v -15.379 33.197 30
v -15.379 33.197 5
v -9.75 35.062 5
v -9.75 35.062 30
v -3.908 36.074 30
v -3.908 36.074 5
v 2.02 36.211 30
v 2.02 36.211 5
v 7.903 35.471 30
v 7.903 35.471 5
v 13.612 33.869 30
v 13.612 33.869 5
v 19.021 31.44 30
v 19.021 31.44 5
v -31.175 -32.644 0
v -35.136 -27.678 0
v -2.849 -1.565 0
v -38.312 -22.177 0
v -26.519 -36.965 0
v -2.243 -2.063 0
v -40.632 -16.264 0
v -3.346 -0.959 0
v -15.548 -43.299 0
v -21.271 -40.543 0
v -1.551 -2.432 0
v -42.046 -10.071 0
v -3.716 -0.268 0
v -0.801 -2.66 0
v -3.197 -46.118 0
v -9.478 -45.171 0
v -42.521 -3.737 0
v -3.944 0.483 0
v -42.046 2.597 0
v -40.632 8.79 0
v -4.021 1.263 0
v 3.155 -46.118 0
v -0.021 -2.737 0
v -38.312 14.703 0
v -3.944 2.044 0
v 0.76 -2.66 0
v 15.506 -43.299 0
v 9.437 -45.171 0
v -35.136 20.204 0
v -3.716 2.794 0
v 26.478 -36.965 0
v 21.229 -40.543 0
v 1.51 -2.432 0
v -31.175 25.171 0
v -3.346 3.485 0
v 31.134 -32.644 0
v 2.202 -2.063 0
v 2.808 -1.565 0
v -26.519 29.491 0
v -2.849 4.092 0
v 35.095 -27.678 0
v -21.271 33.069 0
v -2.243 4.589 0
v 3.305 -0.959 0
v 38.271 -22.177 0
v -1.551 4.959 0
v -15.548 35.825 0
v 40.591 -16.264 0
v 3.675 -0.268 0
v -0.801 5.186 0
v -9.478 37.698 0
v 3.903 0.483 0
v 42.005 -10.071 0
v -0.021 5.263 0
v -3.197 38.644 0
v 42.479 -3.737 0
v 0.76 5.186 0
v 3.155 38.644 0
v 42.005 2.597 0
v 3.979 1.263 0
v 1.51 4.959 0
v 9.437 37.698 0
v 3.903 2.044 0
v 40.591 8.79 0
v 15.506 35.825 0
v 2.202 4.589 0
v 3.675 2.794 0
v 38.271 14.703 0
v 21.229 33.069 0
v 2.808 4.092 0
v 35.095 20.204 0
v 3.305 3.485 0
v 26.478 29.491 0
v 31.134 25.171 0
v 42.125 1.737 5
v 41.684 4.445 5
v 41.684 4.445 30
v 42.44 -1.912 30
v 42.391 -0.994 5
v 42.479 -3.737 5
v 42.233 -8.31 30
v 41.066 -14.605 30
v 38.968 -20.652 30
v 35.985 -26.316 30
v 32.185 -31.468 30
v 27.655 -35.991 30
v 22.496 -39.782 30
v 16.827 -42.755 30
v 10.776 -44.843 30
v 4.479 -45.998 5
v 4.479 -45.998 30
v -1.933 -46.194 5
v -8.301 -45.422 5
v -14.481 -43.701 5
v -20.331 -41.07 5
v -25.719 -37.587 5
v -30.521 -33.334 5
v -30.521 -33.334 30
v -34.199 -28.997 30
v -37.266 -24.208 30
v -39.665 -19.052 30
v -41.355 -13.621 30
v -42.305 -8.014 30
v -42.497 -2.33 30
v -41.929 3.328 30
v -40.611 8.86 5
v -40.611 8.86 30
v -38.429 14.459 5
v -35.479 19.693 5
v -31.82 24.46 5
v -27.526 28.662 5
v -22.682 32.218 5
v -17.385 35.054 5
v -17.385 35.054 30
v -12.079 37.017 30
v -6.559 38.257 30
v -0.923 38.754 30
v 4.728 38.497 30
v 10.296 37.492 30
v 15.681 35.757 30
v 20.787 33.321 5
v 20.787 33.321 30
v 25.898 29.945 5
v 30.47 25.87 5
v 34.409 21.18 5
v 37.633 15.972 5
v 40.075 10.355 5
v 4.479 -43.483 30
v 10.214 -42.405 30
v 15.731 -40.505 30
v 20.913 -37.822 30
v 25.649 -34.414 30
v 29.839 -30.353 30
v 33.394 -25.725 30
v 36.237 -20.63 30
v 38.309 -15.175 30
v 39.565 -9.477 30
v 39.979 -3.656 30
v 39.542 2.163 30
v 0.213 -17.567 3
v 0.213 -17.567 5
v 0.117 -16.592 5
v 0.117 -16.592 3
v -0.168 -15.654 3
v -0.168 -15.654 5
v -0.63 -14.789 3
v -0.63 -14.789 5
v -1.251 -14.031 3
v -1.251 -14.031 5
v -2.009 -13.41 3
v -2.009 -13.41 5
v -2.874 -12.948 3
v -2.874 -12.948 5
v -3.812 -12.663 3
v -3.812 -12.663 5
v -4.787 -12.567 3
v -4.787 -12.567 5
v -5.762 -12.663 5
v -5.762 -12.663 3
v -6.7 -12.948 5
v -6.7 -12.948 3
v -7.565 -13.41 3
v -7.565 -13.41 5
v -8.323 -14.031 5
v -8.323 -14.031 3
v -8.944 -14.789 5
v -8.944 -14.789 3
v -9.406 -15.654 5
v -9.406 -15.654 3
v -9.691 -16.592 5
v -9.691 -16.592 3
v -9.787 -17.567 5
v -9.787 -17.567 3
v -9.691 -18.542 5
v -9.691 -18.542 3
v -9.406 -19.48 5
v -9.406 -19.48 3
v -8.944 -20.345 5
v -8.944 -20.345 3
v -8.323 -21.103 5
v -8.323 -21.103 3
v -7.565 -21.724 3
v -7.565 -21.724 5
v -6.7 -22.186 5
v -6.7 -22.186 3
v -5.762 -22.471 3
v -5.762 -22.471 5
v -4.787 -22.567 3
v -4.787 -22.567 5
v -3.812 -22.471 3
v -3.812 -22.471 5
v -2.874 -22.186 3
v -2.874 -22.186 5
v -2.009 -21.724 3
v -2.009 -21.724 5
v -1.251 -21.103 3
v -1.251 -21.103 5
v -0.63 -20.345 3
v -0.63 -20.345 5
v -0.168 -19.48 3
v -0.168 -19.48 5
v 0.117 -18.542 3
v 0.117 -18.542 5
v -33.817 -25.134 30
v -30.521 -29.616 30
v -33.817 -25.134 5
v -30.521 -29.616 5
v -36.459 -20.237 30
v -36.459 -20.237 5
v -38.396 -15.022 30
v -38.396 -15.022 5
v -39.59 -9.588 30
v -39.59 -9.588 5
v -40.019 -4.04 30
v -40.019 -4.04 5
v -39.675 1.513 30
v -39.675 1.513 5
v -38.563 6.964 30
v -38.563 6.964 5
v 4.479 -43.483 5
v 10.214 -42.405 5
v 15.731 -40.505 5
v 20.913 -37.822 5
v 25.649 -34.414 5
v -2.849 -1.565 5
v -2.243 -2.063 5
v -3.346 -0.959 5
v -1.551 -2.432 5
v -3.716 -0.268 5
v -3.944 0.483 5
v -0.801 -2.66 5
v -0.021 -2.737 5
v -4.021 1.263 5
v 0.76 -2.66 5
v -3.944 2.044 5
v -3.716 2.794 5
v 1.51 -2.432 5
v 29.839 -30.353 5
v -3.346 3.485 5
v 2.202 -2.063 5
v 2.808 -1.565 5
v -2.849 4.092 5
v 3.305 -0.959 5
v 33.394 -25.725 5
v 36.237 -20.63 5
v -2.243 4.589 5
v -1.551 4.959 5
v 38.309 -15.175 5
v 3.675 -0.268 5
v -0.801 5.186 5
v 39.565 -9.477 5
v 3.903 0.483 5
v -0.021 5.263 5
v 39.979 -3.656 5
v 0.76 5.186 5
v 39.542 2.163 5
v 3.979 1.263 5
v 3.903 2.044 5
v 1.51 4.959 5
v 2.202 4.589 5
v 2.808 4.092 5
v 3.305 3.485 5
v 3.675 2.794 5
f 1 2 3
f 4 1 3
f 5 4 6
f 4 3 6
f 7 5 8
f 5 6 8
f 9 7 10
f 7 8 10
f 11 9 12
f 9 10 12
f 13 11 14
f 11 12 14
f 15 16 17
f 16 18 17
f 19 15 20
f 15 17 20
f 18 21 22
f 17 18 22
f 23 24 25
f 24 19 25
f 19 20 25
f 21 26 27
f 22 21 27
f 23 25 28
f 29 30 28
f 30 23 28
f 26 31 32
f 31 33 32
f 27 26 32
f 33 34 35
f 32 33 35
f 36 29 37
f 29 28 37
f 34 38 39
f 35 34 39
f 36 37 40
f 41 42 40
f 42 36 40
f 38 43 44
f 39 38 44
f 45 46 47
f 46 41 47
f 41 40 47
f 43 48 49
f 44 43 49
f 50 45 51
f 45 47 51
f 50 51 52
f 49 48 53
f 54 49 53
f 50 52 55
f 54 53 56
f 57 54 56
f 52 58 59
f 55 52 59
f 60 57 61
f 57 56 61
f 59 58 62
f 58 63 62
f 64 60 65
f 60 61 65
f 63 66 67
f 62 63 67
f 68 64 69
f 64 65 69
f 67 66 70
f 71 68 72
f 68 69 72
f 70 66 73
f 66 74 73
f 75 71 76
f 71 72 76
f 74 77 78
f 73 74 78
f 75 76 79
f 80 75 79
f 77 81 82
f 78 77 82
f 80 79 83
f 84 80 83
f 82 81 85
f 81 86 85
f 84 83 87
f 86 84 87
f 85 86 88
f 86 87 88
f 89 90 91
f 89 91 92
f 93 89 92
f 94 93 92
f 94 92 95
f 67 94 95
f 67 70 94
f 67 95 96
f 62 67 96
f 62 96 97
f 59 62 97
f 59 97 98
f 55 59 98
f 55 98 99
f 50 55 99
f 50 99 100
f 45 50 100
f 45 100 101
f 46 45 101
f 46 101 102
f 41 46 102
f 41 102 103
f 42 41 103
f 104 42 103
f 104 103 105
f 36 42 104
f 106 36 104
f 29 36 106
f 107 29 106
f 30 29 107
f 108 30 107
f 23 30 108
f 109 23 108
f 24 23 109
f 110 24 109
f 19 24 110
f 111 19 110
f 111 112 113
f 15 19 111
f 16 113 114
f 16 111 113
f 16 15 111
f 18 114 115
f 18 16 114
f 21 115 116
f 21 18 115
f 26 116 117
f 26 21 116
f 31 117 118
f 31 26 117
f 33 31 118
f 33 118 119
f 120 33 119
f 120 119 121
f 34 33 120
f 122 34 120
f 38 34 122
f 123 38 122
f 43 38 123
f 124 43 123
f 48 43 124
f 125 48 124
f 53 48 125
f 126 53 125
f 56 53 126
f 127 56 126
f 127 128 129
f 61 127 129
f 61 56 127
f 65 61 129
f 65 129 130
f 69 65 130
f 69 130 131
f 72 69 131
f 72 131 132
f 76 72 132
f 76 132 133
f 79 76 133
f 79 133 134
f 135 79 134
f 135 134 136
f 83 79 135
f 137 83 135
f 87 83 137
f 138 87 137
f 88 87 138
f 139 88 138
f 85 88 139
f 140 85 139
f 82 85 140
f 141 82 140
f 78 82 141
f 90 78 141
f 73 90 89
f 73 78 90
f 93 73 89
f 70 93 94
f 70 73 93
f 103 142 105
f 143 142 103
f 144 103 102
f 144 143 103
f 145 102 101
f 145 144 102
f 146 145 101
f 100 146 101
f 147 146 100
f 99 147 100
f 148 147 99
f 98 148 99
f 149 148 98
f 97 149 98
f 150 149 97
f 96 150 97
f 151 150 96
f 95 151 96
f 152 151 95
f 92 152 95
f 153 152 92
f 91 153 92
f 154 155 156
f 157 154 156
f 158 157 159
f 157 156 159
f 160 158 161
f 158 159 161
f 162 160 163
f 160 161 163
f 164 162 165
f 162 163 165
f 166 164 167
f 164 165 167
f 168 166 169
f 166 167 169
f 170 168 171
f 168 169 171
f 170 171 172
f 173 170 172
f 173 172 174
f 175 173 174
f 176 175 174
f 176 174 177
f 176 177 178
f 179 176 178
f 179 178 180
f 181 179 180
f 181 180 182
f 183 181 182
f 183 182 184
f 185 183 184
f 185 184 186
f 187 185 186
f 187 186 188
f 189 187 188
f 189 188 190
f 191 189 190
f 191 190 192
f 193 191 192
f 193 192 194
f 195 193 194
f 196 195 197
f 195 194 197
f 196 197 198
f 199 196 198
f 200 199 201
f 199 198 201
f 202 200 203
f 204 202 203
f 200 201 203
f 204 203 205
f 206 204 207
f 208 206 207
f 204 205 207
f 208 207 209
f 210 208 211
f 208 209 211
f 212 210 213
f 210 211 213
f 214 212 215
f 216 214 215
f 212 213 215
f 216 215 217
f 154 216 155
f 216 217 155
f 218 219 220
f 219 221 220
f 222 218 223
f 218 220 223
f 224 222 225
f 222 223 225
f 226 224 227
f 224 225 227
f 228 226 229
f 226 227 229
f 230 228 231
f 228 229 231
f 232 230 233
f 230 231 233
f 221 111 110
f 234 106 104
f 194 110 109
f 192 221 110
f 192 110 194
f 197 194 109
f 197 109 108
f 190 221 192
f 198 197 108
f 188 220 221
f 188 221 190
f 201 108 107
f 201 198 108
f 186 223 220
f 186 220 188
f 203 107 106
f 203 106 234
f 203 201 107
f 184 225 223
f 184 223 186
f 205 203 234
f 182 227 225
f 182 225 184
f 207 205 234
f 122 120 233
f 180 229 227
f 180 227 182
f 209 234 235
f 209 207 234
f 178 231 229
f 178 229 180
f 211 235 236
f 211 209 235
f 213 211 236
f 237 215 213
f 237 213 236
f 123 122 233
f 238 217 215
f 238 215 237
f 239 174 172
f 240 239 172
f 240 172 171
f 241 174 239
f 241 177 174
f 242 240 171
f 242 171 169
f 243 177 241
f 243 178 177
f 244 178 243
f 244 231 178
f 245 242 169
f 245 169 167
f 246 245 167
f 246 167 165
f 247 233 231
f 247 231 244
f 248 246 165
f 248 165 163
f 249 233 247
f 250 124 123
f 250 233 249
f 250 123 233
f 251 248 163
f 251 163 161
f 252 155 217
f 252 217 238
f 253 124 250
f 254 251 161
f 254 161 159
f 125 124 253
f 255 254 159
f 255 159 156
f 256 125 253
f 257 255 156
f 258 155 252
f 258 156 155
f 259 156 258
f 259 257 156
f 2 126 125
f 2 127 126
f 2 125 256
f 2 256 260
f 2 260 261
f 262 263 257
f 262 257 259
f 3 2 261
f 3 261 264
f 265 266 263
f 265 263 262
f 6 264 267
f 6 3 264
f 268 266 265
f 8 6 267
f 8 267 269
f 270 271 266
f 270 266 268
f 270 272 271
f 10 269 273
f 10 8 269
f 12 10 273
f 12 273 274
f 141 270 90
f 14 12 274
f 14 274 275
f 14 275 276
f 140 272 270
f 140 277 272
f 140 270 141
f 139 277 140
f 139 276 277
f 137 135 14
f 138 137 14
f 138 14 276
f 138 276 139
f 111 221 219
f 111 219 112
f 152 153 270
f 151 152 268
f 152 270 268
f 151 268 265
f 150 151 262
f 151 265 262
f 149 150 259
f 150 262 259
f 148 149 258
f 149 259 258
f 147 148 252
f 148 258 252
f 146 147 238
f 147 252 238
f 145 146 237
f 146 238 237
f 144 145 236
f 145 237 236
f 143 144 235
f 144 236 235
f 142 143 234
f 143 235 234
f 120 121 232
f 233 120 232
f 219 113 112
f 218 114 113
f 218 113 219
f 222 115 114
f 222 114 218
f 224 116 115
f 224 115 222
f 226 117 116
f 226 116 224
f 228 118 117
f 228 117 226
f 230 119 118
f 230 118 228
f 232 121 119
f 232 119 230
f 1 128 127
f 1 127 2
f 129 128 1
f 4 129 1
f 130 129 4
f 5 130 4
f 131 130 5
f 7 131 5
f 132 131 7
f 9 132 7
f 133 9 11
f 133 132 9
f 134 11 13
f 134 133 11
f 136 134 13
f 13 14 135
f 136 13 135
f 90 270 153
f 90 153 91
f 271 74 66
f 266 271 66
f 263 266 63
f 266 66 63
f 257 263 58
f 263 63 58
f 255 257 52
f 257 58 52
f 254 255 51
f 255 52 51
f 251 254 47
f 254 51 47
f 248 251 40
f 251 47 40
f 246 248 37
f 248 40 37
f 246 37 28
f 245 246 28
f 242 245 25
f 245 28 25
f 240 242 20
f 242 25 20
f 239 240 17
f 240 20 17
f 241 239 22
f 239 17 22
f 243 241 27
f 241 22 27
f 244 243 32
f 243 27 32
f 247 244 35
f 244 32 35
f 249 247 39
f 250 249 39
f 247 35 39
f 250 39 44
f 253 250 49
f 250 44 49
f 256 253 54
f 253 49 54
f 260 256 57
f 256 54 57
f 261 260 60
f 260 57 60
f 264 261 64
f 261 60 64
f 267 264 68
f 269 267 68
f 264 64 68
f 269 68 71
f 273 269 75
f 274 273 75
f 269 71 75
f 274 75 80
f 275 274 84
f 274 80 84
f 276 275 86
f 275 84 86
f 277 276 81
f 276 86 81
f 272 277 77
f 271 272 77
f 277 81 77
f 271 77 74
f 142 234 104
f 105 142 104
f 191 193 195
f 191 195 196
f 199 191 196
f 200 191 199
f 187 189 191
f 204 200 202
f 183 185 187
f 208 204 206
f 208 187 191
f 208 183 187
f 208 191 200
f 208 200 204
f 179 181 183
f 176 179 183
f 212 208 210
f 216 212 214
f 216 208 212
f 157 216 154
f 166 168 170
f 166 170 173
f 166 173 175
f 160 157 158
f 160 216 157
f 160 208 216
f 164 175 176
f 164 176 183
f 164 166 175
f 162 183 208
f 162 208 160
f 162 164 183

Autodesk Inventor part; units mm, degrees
ref_plane "YZ Plane" through (0, 0, 0) normal (1, 0, 0) x (0, 1, 0)
ref_plane "XZ Plane" through (0, 0, 0) normal (0, 1, 0) x (-1, 0, 0)
ref_plane "XY Plane" through (0, 0, 0) normal (0, 0, 1) x (1, 0, 0)
sketch "Sketch1" plane through (0, 0, 0) normal (0, 0, 1) x (1, 0, 0)
  circle A0 centre (-0.0206, -3.7368) radius 40
  circle A1 centre (-0.0206, -3.7368) radius 42.5
  circle A2 centre (-0.0206, 1.2632) radius 4
  line L0 (-6.0206, 0.0132) -> (5.9794, 0.0132)
  line L1 (5.9794, 0.0132) -> (5.9794, 2.5132)
  line L2 (5.9794, 2.5132) -> (-6.0206, 2.5132)
  line L3 (-6.0206, 2.5132) -> (-6.0206, 0.0132)
  line L4 (-17.3849, 35.0541) -> (-15.3788, 33.1973)
  line L5 (-40.6108, 8.8603) -> (-38.5626, 6.9645)
  line L6 (19.021, 31.4401) -> (21.6473, 34.2375)
  line L7 (39.5419, 2.1626) -> (44.5969, 7.547)
  line L8 (4.4794, -43.4829) -> (4.4794, -45.9979)
  line L9 (-30.5206, -29.6164) -> (-30.5206, -33.3341)
  point P0 (0, 0)
  point P1 (-0.0206, -53.7368)
  point P2 (-0.0206, -9.5426)
  point P3 (-3.8203, 2.5132)
  point P4 (3.779, 2.5132)
  point P5 (3.779, 0.0132)
  point P6 (-3.8203, 0.0132)
  point P7 (-30.452, -29.697)
  point P8 (20.787, 33.3211)
  point P9 (41.6844, 4.4447)
  point P10 (-30.5206, -31.4752)
  dimension "d4" = 40
  dimension "d7" = 50
  dimension "d9" = 8
  dimension "d10" = 12
  dimension "d11" = 2.5
  dimension "d12" = 55
  dimension "d13" = 1.25
  dimension "d14" = 85
  dimension "d15" = 2.5
  dimension "d49" = 35
  dimension "d67" = 35
  dimension "d80" = 35
extrude "Extrusion1" add sketch "Sketch1" along normal blind 5 contours A0 | A0 L7 A1 L8 | A0 L6 A1 L7 | L8 A1 L9 A0 | A0 L4 A1 L6 | L9 A1 L5 A0 | A0 L5 A1 L4 | A2 L0 L2 | A2 L2 L1 L0 | L2 A2 | A2 L0 | A2 L0 L3 L2
extrude "Extrusion10" add sketch "Sketch1" along normal blind 30 contours A0 L7 A1 L8 | A0 L4 A1 L6 | L9 A1 L5 A0 | A2 L0 L2 | L2 A2 | A2 L0
extrude "Extrusion11" cut sketch "Sketch1" along normal blind 30 contours A2 L0 L2 | L2 A2 | A2 L0
sketch "Sketch2" plane through (0, 0, 5) normal (0, 0, 1) x (1, 0, 0)
  circle A0 centre (-0.0206, -3.7368) radius 42.5 projected
  circle A1 centre (-4.787, -17.567) radius 5
  point P0 (0, 0)
  dimension "d94" = 10
extrude "Extrusion12" cut sketch "Sketch2" against normal blind 2 contours A1
properties part number "tryy2"
